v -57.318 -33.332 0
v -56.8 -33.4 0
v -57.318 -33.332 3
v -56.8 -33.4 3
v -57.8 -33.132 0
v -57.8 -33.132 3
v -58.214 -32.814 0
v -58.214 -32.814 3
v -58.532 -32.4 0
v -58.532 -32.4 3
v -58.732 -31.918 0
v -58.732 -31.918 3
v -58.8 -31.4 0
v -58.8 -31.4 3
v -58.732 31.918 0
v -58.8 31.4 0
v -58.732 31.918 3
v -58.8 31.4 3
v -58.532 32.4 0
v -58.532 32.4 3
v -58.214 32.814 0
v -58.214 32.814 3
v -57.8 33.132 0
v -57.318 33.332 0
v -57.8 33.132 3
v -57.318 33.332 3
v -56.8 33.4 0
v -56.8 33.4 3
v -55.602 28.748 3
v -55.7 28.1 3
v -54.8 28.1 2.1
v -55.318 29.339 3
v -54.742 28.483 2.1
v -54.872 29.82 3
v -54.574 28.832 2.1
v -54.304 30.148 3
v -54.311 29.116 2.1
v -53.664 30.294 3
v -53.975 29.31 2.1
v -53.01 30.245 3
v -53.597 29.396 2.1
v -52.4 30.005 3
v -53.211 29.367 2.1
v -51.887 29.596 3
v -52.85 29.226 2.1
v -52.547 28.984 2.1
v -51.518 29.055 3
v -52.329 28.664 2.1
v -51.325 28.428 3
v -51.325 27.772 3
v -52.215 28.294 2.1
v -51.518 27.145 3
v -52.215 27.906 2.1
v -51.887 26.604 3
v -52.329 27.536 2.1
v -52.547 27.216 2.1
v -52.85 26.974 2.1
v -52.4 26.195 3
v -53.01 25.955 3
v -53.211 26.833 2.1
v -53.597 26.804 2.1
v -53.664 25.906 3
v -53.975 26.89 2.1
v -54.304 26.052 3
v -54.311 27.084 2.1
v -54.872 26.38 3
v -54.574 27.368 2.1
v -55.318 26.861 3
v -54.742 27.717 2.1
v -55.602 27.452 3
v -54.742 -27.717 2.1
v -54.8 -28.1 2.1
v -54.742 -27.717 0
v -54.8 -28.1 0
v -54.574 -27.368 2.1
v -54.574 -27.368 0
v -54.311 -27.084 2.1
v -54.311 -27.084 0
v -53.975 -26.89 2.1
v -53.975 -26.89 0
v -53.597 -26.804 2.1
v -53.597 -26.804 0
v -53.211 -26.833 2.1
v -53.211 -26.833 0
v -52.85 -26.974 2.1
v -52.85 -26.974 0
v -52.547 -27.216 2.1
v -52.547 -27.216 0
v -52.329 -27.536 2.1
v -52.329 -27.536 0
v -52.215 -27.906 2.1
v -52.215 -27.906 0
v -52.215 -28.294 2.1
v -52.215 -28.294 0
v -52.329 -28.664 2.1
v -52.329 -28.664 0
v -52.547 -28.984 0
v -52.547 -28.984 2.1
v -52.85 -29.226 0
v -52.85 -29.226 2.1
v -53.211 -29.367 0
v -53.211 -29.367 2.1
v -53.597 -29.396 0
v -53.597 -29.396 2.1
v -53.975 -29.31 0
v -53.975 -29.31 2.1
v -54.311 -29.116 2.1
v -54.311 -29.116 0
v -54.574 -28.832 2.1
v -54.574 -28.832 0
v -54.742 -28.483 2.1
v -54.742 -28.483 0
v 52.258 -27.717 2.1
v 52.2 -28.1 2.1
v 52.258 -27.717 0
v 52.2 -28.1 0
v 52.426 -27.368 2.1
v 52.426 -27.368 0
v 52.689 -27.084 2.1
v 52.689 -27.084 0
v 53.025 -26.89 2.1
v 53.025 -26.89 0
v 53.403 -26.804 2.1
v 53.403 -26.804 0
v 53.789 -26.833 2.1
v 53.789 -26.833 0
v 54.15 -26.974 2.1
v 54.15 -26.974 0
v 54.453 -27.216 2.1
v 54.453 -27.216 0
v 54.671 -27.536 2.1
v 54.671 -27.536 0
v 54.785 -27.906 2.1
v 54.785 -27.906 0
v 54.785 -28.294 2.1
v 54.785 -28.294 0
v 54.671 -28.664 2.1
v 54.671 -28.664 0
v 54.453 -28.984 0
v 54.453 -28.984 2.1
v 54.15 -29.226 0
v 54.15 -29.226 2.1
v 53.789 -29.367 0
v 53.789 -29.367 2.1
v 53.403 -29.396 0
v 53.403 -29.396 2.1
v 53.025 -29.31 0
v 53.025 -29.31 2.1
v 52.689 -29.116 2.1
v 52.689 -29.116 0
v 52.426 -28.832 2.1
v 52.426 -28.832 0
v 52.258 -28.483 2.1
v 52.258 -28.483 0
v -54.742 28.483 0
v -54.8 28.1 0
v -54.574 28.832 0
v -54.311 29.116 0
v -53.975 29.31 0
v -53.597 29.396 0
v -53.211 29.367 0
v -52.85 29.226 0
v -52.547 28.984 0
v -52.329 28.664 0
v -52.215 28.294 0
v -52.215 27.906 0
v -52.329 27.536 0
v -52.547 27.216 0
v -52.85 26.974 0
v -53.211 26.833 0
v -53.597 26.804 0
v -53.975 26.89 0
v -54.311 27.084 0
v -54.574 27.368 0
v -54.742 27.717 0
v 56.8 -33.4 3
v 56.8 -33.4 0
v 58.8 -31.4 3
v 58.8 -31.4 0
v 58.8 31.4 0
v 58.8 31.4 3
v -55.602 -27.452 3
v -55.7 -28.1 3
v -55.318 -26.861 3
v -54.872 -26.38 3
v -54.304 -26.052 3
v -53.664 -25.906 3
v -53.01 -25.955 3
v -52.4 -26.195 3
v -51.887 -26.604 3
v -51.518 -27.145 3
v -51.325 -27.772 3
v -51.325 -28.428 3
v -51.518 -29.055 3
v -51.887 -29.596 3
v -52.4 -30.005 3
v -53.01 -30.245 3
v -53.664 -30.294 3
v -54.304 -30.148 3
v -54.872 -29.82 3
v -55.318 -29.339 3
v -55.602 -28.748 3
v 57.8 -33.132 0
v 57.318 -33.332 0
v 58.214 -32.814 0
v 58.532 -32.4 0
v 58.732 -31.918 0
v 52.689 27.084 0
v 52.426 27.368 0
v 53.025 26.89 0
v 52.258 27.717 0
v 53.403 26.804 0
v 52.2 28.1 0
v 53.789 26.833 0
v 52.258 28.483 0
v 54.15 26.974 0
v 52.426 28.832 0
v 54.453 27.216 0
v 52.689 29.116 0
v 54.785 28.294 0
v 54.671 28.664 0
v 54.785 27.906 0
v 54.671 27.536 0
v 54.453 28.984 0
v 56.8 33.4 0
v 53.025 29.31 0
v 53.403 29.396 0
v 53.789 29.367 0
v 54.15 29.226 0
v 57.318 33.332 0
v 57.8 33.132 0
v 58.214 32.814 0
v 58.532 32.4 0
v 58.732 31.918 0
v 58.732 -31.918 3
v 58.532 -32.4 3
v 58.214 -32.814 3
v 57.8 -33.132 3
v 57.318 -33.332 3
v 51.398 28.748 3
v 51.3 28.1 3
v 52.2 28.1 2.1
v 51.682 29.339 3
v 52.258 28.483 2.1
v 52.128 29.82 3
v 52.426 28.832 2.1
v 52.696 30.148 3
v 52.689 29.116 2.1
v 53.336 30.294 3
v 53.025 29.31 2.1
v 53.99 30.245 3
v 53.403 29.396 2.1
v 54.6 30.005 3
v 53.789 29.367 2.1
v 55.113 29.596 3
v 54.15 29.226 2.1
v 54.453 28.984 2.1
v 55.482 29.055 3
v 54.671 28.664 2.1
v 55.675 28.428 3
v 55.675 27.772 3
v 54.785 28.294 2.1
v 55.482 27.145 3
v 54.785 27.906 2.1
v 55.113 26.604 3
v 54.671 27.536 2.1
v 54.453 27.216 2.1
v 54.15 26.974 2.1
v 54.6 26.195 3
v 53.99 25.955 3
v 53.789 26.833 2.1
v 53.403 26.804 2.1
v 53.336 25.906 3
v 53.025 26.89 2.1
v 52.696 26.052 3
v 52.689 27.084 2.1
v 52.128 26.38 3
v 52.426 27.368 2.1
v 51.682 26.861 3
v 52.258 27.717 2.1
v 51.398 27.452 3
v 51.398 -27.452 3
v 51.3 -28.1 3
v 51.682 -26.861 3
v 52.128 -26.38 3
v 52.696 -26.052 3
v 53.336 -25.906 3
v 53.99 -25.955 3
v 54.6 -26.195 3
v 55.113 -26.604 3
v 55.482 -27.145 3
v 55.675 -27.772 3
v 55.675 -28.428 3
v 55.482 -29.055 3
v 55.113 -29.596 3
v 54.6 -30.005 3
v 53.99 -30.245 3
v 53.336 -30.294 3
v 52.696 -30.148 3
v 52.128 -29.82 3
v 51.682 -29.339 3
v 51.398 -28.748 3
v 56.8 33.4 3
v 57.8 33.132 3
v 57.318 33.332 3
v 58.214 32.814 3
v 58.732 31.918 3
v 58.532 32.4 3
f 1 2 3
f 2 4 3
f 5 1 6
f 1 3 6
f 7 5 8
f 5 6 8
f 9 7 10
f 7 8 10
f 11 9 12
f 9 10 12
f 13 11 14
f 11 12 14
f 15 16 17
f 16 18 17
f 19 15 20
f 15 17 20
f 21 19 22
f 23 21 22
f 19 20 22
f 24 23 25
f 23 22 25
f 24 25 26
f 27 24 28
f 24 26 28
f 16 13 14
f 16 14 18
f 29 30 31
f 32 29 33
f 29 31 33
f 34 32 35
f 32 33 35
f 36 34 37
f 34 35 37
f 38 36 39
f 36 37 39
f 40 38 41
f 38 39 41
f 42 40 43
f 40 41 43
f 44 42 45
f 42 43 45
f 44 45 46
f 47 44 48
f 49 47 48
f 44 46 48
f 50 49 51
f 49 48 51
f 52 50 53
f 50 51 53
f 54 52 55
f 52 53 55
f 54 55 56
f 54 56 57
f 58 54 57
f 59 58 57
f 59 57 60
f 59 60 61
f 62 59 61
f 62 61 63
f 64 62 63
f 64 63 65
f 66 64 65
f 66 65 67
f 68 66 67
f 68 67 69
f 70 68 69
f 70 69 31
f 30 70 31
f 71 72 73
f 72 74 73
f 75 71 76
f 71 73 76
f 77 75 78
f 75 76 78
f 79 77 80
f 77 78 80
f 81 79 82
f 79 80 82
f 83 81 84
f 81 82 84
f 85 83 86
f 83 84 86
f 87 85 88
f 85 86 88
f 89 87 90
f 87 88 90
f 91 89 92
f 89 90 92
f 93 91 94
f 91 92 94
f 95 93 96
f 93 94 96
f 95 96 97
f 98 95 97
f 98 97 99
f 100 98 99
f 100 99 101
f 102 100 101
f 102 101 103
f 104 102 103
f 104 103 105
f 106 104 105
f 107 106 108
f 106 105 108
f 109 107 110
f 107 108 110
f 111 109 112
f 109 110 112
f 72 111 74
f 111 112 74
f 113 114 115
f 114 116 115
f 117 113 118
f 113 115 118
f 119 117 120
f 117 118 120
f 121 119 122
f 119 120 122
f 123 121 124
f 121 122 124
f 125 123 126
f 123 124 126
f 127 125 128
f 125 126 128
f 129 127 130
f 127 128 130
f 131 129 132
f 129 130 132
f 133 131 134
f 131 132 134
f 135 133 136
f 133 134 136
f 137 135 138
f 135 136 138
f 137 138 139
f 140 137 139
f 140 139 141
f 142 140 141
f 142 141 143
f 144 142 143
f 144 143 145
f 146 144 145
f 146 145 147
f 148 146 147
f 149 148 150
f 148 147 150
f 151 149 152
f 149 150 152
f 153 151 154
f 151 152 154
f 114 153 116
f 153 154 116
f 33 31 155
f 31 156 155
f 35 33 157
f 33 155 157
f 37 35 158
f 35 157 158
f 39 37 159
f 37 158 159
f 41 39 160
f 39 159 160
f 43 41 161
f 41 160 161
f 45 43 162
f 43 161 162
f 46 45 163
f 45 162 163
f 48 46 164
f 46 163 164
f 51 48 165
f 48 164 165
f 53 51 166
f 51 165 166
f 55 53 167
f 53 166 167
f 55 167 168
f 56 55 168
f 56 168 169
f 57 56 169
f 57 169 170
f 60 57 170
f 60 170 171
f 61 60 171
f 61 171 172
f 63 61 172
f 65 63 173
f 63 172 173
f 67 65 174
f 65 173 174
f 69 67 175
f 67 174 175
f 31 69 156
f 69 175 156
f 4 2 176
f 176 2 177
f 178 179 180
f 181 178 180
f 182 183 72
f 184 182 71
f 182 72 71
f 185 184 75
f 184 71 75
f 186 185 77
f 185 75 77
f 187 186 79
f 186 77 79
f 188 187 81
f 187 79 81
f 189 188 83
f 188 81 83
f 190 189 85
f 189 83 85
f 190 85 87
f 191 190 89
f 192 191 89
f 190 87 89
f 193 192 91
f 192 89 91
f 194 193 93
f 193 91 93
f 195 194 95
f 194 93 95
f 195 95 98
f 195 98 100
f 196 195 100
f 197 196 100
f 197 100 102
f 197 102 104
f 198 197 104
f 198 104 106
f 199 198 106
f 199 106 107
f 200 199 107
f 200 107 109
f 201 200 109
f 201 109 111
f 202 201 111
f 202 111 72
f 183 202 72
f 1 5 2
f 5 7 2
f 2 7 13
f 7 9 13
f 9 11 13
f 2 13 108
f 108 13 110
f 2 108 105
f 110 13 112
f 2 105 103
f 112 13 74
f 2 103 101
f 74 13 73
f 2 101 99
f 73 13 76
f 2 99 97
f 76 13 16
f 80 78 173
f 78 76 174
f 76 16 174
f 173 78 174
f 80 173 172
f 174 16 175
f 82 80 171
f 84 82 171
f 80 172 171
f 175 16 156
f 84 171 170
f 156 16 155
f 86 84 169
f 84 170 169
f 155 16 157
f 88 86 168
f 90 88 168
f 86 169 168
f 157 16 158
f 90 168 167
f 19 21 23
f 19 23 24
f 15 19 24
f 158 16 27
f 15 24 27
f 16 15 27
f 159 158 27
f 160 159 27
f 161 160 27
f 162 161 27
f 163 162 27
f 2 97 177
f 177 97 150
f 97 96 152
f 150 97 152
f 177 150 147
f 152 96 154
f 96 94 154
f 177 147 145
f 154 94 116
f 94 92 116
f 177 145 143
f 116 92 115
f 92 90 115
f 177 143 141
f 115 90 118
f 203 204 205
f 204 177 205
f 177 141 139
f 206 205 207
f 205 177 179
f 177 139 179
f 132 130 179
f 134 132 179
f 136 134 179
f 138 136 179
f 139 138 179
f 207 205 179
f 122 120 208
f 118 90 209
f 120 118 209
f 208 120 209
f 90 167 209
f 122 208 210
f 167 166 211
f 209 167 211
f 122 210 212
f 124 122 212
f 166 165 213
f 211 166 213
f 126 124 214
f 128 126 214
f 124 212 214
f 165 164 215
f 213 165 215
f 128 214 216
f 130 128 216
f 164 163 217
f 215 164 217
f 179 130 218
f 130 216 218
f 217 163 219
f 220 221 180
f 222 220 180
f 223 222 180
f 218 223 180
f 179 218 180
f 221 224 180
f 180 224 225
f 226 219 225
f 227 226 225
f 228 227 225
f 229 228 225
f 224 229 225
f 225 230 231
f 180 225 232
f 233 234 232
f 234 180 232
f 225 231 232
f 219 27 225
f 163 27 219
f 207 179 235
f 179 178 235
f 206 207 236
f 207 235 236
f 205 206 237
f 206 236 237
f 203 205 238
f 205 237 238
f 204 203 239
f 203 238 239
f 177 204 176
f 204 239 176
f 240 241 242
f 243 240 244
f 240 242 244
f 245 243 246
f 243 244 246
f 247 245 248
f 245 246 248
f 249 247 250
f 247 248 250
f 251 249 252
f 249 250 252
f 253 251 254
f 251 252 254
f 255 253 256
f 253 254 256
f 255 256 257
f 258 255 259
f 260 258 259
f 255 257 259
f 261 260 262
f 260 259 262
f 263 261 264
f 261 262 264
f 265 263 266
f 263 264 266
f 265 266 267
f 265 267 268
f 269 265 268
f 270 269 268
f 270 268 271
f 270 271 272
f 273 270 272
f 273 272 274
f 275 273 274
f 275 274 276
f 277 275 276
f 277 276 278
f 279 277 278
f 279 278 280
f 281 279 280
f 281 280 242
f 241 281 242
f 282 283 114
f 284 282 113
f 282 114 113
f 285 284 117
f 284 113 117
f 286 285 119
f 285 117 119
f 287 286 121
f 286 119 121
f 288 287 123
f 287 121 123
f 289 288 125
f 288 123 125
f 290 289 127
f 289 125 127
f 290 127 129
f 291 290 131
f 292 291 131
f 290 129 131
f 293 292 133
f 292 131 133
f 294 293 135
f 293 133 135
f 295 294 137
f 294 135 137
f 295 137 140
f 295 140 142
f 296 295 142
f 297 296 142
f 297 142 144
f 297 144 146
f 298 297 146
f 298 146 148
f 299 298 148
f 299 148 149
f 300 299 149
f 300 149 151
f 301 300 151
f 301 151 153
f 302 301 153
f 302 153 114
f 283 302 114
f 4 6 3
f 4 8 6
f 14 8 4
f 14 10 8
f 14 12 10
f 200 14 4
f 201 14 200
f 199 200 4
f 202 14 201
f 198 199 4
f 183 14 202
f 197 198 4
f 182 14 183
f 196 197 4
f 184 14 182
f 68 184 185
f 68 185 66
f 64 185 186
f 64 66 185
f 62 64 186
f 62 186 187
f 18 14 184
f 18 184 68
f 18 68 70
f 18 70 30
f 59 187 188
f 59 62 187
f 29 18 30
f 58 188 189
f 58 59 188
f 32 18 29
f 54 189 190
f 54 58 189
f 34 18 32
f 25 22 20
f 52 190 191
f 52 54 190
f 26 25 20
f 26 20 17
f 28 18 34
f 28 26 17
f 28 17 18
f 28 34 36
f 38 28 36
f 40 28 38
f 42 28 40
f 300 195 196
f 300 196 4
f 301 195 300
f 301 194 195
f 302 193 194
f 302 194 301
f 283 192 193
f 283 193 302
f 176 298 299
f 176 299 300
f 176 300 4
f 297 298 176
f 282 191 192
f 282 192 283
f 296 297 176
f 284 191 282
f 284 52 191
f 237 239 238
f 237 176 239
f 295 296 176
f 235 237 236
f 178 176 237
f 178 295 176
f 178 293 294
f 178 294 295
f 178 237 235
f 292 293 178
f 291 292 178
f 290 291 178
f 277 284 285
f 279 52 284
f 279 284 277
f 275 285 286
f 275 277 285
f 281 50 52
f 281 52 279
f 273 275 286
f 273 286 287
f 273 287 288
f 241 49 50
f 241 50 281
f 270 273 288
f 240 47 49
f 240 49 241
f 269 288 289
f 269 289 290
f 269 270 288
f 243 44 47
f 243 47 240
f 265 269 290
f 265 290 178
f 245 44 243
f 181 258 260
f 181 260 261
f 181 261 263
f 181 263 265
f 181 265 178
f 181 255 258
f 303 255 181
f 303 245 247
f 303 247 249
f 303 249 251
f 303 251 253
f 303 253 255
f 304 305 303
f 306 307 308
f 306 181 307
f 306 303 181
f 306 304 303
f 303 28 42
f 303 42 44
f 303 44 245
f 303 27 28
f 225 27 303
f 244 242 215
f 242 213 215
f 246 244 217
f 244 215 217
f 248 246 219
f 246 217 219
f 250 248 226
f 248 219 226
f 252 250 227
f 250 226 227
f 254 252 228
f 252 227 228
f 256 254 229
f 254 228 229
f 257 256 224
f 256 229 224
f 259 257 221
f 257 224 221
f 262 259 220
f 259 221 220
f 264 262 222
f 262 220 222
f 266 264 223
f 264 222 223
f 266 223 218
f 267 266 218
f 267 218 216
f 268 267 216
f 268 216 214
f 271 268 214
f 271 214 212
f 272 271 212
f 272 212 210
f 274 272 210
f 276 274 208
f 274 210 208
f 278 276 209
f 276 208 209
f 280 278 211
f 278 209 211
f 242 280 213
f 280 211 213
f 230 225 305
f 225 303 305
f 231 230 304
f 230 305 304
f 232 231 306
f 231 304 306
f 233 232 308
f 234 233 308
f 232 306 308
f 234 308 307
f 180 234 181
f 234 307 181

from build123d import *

# Parameters (mm, degrees)
SCHIZZO1_W                             = 117.6
SCHIZZO1_H                             = 66.8
ESTRUSIONE_ESTRUSIONE1_DEPTH           = 3
RACCORDO1_R                            = 2
RACCORDO2_R                            = 2
RACCORDO3_R                            = 2
RACCORDO4_R                            = 2
FORO_SVASATO_PER_VITE_M2_1_D           = 2.6
FORO_SVASATO_PER_VITE_M2_1_CSINK_D     = 4.4
FORO_SVASATO_PER_VITE_M2_1_CSINK_ANGLE = 90


with BuildPart() as part:
    # Schizzo1 → Estrusione-Estrusione1 (new body)
    with BuildSketch(Plane.XY):
        Rectangle(SCHIZZO1_W, SCHIZZO1_H)
    extrude(amount=ESTRUSIONE_ESTRUSIONE1_DEPTH)

    # Raccordo1
    raccordo1_edges = [part.edges().sort_by_distance(p)[0] for p in [
        (-58.8, 33.4, 1.5),
    ]]
    fillet(raccordo1_edges, radius=RACCORDO1_R)

    # Raccordo2
    raccordo2_edges = [part.edges().sort_by_distance(p)[0] for p in [
        (58.8, 33.4, 1.5),
    ]]
    fillet(raccordo2_edges, radius=RACCORDO2_R)

    # Raccordo3
    raccordo3_edges = [part.edges().sort_by_distance(p)[0] for p in [
        (58.8, -33.4, 1.5),
    ]]
    fillet(raccordo3_edges, radius=RACCORDO3_R)

    # Raccordo4
    raccordo4_edges = [part.edges().sort_by_distance(p)[0] for p in [
        (-58.8, -33.4, 1.5),
    ]]
    fillet(raccordo4_edges, radius=RACCORDO4_R)

    # Foro svasato per Vite M2-1 (through all)
    with Locations(Plane.XY.offset(3)):
        with Locations((53.5, 28.1), (-53.5, 28.1), (-53.5, -28.1), (53.5, -28.1)):
            CounterSinkHole(FORO_SVASATO_PER_VITE_M2_1_D / 2, FORO_SVASATO_PER_VITE_M2_1_CSINK_D / 2, counter_sink_angle=FORO_SVASATO_PER_VITE_M2_1_CSINK_ANGLE)


solid = part.part
